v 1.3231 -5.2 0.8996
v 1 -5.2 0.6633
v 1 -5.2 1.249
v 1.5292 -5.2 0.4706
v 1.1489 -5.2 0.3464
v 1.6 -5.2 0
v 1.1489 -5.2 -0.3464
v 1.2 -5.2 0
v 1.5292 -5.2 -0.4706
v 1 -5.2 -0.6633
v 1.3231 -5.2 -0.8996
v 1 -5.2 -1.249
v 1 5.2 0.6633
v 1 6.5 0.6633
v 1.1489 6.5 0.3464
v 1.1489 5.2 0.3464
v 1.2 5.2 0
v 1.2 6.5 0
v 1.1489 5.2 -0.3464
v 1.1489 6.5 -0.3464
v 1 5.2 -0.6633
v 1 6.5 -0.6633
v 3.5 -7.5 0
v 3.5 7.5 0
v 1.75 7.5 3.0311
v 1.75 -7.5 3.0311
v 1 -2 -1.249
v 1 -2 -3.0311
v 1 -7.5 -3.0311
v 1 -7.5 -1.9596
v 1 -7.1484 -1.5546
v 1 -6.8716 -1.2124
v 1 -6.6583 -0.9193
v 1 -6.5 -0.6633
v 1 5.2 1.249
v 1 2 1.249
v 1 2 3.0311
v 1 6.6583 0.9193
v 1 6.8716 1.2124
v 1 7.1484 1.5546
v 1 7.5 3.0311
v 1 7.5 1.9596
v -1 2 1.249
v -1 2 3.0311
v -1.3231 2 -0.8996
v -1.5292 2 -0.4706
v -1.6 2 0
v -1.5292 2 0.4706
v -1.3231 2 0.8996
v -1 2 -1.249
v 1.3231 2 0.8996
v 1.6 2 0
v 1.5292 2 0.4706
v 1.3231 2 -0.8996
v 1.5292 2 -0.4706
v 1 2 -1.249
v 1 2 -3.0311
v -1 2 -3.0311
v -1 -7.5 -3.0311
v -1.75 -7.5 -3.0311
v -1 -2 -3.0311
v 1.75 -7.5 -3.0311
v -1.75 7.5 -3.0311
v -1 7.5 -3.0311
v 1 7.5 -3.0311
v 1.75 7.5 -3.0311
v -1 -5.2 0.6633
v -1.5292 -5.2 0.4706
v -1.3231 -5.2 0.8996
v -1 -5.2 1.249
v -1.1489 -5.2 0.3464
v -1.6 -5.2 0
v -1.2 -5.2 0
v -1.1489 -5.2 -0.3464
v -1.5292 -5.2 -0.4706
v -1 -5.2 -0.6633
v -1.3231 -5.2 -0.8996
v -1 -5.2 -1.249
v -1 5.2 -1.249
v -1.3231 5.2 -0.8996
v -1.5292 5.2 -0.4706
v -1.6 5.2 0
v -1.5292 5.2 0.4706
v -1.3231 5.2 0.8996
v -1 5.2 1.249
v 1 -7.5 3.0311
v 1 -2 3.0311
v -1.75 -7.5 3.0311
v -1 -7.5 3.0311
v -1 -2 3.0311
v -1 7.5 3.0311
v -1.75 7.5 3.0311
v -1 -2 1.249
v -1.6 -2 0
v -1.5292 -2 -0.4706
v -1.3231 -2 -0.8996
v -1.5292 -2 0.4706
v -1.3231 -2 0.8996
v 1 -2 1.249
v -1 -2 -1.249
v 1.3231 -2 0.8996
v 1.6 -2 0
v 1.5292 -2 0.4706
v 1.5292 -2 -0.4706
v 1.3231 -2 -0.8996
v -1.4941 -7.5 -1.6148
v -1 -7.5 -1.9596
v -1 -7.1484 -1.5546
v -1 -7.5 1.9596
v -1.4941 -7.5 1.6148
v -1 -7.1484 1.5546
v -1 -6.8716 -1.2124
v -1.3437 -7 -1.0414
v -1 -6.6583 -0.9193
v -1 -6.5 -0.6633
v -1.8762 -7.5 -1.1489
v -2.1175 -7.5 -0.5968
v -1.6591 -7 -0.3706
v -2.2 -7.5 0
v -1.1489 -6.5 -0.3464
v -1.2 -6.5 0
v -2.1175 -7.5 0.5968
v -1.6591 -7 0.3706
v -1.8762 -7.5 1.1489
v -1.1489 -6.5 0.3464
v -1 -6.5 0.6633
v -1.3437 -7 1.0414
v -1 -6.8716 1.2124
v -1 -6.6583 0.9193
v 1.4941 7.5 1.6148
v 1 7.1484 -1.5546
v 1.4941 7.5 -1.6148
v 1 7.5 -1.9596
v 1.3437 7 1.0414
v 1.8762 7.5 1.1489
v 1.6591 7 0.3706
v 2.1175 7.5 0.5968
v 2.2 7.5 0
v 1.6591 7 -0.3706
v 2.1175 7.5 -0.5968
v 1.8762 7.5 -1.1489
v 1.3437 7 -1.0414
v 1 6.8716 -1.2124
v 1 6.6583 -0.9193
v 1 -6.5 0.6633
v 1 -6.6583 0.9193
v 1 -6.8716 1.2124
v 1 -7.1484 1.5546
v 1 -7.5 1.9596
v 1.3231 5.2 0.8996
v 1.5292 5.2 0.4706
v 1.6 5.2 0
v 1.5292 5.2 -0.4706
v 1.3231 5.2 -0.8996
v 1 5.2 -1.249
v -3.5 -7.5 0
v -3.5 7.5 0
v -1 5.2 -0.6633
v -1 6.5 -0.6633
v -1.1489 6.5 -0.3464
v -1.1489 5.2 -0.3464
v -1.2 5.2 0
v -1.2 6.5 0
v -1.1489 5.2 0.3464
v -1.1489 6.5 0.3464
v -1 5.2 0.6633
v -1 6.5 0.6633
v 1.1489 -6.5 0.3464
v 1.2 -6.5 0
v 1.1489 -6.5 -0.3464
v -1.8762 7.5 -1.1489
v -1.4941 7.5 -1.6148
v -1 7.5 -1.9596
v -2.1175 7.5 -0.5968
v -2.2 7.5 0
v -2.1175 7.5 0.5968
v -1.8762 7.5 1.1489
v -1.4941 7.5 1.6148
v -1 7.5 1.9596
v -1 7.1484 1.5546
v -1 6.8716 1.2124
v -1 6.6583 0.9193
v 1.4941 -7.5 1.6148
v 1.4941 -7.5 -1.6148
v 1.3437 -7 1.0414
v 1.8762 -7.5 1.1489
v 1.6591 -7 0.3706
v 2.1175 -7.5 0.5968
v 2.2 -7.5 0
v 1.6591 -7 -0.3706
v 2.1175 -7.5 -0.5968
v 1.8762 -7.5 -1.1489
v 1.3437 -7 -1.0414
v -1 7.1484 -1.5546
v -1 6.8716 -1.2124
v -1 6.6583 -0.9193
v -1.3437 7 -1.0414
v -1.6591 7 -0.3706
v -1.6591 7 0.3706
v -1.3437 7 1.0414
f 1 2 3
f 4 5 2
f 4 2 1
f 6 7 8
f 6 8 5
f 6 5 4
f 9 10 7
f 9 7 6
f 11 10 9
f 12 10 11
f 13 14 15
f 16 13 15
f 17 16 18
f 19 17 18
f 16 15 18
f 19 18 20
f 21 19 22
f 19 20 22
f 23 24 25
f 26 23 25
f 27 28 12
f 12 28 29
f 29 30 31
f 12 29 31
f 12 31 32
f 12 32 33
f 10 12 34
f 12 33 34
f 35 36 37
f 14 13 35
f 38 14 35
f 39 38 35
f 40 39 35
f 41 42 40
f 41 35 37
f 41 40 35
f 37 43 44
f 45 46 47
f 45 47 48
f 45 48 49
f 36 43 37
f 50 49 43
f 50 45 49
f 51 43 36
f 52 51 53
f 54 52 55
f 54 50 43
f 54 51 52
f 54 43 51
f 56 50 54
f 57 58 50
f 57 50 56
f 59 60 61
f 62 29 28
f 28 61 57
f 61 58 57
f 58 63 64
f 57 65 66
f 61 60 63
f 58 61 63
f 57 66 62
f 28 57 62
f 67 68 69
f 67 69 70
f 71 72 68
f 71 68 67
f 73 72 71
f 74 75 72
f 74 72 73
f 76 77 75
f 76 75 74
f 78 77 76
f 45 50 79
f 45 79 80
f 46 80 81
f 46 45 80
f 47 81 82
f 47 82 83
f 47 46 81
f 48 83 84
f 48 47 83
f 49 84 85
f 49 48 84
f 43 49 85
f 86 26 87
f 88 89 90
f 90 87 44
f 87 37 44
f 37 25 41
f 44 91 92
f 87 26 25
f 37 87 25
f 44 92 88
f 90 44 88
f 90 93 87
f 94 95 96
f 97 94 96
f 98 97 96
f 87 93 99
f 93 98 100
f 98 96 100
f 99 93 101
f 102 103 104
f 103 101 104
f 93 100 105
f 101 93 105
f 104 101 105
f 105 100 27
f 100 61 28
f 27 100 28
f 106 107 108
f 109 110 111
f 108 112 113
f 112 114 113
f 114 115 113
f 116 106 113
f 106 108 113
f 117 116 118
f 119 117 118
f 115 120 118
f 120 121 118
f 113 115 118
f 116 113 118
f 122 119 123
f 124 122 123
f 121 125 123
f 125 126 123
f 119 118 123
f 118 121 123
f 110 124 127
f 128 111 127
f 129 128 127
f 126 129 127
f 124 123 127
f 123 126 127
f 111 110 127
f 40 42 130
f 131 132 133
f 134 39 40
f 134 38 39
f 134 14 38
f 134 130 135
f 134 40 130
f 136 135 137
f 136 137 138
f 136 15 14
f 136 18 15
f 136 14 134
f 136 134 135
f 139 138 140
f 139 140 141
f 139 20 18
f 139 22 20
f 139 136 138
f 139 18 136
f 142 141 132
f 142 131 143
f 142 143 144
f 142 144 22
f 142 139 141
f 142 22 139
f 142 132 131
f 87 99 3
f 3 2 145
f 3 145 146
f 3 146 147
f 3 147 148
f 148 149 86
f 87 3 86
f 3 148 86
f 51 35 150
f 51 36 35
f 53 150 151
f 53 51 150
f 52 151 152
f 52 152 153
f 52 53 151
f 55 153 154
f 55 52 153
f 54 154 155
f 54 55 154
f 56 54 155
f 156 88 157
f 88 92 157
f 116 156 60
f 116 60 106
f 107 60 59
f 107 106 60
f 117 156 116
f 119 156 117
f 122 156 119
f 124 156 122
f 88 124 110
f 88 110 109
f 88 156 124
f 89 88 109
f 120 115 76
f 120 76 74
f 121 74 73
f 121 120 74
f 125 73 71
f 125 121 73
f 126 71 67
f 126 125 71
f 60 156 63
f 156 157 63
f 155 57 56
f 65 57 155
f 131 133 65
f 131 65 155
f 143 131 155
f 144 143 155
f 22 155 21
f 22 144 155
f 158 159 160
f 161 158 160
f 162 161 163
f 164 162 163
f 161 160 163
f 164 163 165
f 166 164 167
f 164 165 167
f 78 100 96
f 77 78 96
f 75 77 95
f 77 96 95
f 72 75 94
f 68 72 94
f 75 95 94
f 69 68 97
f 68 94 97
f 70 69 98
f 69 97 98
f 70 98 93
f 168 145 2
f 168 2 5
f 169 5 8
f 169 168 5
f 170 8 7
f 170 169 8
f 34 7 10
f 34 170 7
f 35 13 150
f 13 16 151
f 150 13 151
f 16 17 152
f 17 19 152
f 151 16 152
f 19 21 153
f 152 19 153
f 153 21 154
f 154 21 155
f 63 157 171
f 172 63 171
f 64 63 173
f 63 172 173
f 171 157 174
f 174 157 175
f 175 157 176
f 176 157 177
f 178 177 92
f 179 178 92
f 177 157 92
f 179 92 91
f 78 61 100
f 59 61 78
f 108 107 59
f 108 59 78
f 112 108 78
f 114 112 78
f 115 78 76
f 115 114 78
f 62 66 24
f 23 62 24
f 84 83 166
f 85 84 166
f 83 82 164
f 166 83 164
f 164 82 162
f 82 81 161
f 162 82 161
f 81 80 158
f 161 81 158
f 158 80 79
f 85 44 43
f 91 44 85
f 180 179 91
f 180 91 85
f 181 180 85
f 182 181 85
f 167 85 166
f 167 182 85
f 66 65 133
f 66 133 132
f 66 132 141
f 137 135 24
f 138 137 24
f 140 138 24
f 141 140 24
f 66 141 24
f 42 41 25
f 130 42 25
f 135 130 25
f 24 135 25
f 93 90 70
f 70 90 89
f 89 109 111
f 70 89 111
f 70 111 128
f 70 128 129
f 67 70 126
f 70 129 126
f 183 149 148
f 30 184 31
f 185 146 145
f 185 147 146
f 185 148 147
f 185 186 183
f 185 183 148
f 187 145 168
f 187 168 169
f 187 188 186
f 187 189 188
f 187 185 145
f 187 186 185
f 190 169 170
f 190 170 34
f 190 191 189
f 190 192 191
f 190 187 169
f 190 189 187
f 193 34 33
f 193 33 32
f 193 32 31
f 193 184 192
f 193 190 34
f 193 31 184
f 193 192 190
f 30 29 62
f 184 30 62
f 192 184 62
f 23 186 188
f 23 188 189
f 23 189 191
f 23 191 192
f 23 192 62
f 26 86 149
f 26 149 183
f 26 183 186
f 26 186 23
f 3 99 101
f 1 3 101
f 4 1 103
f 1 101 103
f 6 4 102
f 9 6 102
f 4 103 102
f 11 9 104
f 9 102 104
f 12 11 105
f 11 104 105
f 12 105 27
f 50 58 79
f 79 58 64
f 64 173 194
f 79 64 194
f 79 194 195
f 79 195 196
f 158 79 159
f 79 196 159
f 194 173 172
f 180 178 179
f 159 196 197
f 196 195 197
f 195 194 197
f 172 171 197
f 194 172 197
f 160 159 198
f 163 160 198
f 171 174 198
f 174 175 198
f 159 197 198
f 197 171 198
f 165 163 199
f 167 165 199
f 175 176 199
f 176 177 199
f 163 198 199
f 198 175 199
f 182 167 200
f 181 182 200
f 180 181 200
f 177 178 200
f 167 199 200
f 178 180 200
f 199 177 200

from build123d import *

# Parameters (mm, degrees)
PAD062_DEPTH      = 7.5
PAD062_DEPTH_BACK = 7.5
POCKET036_DEPTH   = 5.5
SKETCH086_R       = 1.6
POCKET037_DEPTH   = 3.2
CHAMFER007_SIZE   = 1


with BuildPart() as part:
    # Sketch084 → Pad062 (new body, two sides)
    with BuildSketch(Plane.XZ) as pad062_sk:
        Polygon((3.5, 0), (1.75, 3.031089), (-1.75, 3.031089), (-3.5, 0), (-1.75, -3.031089), (1.75, -3.031089), align=None)
    extrude(amount=-PAD062_DEPTH)
    extrude(pad062_sk.sketch, amount=PAD062_DEPTH_BACK)

    # Sketch085 (on Face7 of Pad062) → Pocket036 (cut)
    with BuildSketch(Plane(origin=(0, 7.5, 0), x_dir=(1, 0, 0), z_dir=(0, 1, 0))):
        with BuildLine():
            Line((-1, -3.25), (1, -3.25))
            Line((1, -0.663325), (1, -3.25))
            ThreePointArc((1, -0.663325), (1.2, 0), (1, 0.663325))
            Line((1, 3.25), (1, 0.663325))
            Line((1, 3.25), (-1, 3.25))
            Line((-1, 3.25), (-1, 0.663325))
            ThreePointArc((-1, 0.663325), (-1.2, 0), (-1, -0.663325))
            Line((-1, -3.25), (-1, -0.663325))
        make_face()
    pocket036 = extrude(amount=-POCKET036_DEPTH, mode=Mode.SUBTRACT)

    # Mirrored008: Pocket036 across XZ
    add(pocket036.mirror(Plane.XZ), mode=Mode.SUBTRACT)

    # Sketch086 (on Face8 of Mirrored008) → Pocket037 (cut)
    with BuildSketch(Plane(origin=(0, 2, 0), x_dir=(1, 0, 0), z_dir=(0, 1, 0))):
        Circle(SKETCH086_R)
    pocket037 = extrude(amount=POCKET037_DEPTH, mode=Mode.SUBTRACT)

    # Mirrored009: Pocket037 across XZ
    add(pocket037.mirror(Plane.XZ), mode=Mode.SUBTRACT)

    # Chamfer007
    chamfer007_edges = [part.edges().sort_by_distance(p)[0] for p in [
        (-1.2, 7.5, 0),
        (1.2, 7.5, 0),
        (1.2, -7.5, 0),
        (-1.2, -7.5, 0),
    ]]
    chamfer(chamfer007_edges, length=CHAMFER007_SIZE)


solid = part.part
